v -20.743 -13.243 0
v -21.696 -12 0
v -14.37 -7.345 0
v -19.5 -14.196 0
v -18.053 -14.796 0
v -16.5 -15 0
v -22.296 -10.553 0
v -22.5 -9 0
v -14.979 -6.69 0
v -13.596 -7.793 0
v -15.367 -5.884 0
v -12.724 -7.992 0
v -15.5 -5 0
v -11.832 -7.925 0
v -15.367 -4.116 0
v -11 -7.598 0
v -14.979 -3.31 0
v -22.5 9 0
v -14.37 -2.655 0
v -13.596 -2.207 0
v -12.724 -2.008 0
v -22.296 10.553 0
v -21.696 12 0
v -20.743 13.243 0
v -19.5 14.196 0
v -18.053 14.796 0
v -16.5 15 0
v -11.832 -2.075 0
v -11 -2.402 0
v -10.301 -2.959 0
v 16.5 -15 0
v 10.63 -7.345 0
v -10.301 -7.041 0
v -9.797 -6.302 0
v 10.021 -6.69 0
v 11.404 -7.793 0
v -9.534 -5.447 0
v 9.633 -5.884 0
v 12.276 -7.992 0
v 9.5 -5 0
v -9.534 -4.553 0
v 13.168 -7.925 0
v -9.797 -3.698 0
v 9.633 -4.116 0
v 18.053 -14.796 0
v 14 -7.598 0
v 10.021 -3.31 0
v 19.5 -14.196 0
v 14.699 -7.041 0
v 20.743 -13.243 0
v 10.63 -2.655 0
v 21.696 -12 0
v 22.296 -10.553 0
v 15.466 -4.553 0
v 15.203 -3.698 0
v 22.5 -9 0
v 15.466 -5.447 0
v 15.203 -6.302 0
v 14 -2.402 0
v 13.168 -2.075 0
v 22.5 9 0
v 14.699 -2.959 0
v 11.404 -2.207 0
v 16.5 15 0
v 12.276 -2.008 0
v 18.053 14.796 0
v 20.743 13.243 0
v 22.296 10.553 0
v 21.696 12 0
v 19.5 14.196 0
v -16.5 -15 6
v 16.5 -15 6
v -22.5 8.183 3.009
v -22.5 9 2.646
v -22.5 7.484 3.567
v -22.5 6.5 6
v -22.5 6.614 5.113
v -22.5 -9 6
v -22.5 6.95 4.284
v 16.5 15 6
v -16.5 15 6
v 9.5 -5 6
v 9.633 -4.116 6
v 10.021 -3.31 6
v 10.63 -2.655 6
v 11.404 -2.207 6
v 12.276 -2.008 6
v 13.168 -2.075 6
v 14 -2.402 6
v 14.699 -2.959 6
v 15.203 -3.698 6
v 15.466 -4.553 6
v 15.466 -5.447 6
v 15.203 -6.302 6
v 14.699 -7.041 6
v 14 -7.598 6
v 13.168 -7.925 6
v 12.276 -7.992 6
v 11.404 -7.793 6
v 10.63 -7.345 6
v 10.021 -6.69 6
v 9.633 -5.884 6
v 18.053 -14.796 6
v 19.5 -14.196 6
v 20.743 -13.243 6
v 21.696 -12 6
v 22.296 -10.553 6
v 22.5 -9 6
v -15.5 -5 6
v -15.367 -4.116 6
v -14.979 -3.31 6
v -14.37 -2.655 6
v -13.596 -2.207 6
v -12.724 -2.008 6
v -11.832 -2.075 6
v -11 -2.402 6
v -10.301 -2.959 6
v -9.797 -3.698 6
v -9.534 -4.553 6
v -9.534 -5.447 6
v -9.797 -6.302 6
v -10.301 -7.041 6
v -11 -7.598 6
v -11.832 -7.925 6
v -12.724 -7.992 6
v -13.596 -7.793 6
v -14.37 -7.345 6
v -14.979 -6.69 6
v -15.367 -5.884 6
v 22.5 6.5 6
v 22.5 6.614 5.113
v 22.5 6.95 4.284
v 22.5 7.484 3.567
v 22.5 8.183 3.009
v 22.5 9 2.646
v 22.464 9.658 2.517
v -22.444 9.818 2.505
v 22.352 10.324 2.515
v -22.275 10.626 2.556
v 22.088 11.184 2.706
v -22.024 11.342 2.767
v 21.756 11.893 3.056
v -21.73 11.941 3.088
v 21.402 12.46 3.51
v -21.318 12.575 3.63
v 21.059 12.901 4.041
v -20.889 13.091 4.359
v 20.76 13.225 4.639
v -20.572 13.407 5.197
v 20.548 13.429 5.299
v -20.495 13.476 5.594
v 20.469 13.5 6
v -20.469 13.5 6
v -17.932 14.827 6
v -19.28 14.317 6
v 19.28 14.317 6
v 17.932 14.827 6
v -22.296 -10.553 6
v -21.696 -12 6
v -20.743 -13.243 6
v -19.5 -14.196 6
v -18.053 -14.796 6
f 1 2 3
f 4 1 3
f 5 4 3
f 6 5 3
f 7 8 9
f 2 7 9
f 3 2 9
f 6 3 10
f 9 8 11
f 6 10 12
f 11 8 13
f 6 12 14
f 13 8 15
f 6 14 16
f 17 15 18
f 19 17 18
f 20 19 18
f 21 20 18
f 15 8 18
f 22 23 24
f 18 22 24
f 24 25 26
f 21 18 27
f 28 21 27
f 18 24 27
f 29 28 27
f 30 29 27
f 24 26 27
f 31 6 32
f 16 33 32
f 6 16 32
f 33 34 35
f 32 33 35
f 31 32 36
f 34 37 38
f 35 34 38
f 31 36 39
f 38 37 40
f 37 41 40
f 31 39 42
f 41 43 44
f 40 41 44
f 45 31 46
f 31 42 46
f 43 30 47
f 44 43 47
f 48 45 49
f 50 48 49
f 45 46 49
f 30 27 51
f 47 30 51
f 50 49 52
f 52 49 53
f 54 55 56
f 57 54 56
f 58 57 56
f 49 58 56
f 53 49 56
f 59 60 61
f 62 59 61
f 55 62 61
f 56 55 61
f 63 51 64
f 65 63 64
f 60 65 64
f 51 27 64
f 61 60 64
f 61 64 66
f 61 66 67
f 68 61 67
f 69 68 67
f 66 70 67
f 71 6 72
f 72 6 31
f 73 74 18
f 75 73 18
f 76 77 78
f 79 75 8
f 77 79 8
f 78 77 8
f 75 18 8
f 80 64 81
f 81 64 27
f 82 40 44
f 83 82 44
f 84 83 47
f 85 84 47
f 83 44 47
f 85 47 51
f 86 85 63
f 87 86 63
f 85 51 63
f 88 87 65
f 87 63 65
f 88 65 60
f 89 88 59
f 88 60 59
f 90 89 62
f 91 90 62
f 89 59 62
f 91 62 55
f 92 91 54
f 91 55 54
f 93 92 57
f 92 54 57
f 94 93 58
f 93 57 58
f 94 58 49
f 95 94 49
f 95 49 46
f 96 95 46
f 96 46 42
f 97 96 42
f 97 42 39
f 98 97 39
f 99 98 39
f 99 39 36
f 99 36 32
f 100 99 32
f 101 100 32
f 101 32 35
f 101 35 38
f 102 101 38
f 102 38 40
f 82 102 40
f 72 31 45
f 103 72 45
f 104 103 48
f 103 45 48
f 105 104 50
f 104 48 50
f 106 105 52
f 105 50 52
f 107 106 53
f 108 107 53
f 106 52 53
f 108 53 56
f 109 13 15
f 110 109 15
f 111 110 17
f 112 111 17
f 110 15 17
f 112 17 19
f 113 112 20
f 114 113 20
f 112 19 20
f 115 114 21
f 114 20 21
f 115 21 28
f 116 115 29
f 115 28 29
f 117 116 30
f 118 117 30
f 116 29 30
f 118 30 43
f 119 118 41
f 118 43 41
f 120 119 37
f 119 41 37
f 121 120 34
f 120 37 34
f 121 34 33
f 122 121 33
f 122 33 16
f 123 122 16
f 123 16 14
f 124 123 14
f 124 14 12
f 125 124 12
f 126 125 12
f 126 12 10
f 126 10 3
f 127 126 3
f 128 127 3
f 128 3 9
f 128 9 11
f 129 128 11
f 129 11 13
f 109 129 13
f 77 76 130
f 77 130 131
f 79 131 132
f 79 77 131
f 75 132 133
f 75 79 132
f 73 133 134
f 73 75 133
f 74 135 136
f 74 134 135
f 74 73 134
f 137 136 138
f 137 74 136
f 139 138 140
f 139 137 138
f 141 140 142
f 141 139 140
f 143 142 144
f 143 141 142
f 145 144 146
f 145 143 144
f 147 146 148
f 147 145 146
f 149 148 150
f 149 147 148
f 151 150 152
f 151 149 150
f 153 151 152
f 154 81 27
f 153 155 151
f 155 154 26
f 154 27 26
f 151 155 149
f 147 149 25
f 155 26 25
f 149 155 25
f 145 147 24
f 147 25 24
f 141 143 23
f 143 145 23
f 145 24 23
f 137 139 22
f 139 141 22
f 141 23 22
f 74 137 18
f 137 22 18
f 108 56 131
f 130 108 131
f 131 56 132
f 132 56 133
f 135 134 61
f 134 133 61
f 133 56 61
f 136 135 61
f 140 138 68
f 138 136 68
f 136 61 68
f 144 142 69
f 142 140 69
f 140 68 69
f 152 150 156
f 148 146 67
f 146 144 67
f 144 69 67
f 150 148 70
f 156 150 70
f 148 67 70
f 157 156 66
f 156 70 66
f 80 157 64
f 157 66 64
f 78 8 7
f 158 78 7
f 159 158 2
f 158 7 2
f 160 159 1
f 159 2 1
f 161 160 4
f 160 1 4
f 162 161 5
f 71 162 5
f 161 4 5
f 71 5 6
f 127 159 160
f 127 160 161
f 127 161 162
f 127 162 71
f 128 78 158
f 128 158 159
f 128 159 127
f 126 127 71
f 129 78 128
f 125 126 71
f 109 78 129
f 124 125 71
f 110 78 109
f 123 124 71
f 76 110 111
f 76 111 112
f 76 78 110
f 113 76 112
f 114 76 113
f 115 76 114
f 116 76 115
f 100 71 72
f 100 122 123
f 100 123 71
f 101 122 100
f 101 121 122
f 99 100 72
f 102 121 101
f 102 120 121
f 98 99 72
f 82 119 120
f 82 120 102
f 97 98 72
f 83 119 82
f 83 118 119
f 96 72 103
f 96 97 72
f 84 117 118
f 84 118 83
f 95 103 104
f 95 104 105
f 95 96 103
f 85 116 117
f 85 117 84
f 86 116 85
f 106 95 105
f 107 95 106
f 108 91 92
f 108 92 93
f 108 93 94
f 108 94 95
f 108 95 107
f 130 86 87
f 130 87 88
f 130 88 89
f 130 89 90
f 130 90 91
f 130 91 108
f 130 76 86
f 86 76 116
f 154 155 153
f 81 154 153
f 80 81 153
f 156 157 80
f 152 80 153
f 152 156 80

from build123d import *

# Parameters (mm, degrees)
Y_KSEKLIK_EKSTR_ZYON1_DEPTH = 6
KES_EKSTR_ZYON1_DEPTH       = 28.699277969
KES_EKSTR_ZYON1_DEPTH_BACK  = 28.699277969
IZIM2_R                     = 3.5
IZIM3_R                     = 3
KES_EKSTR_ZYON2_DEPTH       = 44


with BuildPart() as part:
    # Çizim1 → Yükseklik-Ekstrüzyon1 (new body)
    with BuildSketch(Plane.XY):
        with BuildLine():
            Line((-16.5, -15), (16.5, -15))
            ThreePointArc((16.5, -15), (20.742640687, -13.242640687), (22.5, -9))
            Line((22.5, -9), (22.5, 9))
            ThreePointArc((22.5, 9), (20.742640687, 13.242640687), (16.5, 15))
            Line((16.5, 15), (-16.5, 15))
            ThreePointArc((-16.5, 15), (-20.742640687, 13.242640687), (-22.5, 9))
            Line((-22.5, 9), (-22.5, -9))
            ThreePointArc((-22.5, -9), (-20.742640687, -13.242640687), (-16.5, -15))
        make_face()
    extrude(amount=Y_KSEKLIK_EKSTR_ZYON1_DEPTH)

    # Çizim2 → Kes-Ekstrüzyon1 (cut, two sides: drawn at the far end of the back side and taken through both)
    with BuildSketch(Plane(origin=(0, 0, 0), x_dir=(0, 0, -1), z_dir=(1, 0, 0)).offset(-KES_EKSTR_ZYON1_DEPTH_BACK)):
        with Locations((-6, 10)):
            Circle(IZIM2_R)
    extrude(amount=KES_EKSTR_ZYON1_DEPTH + KES_EKSTR_ZYON1_DEPTH_BACK, mode=Mode.SUBTRACT)

    # Çizim3 → Kes-Ekstrüzyon2 (cut)
    with BuildSketch(Plane(origin=(0, 0, 0), x_dir=(-1, 0, 0), z_dir=(0, 0, -1))):
        with Locations((12.5, -5)):
            Circle(IZIM3_R)
        with Locations((-12.5, -5)):
            Circle(IZIM3_R)
    extrude(amount=-KES_EKSTR_ZYON2_DEPTH, mode=Mode.SUBTRACT)


solid = part.part
